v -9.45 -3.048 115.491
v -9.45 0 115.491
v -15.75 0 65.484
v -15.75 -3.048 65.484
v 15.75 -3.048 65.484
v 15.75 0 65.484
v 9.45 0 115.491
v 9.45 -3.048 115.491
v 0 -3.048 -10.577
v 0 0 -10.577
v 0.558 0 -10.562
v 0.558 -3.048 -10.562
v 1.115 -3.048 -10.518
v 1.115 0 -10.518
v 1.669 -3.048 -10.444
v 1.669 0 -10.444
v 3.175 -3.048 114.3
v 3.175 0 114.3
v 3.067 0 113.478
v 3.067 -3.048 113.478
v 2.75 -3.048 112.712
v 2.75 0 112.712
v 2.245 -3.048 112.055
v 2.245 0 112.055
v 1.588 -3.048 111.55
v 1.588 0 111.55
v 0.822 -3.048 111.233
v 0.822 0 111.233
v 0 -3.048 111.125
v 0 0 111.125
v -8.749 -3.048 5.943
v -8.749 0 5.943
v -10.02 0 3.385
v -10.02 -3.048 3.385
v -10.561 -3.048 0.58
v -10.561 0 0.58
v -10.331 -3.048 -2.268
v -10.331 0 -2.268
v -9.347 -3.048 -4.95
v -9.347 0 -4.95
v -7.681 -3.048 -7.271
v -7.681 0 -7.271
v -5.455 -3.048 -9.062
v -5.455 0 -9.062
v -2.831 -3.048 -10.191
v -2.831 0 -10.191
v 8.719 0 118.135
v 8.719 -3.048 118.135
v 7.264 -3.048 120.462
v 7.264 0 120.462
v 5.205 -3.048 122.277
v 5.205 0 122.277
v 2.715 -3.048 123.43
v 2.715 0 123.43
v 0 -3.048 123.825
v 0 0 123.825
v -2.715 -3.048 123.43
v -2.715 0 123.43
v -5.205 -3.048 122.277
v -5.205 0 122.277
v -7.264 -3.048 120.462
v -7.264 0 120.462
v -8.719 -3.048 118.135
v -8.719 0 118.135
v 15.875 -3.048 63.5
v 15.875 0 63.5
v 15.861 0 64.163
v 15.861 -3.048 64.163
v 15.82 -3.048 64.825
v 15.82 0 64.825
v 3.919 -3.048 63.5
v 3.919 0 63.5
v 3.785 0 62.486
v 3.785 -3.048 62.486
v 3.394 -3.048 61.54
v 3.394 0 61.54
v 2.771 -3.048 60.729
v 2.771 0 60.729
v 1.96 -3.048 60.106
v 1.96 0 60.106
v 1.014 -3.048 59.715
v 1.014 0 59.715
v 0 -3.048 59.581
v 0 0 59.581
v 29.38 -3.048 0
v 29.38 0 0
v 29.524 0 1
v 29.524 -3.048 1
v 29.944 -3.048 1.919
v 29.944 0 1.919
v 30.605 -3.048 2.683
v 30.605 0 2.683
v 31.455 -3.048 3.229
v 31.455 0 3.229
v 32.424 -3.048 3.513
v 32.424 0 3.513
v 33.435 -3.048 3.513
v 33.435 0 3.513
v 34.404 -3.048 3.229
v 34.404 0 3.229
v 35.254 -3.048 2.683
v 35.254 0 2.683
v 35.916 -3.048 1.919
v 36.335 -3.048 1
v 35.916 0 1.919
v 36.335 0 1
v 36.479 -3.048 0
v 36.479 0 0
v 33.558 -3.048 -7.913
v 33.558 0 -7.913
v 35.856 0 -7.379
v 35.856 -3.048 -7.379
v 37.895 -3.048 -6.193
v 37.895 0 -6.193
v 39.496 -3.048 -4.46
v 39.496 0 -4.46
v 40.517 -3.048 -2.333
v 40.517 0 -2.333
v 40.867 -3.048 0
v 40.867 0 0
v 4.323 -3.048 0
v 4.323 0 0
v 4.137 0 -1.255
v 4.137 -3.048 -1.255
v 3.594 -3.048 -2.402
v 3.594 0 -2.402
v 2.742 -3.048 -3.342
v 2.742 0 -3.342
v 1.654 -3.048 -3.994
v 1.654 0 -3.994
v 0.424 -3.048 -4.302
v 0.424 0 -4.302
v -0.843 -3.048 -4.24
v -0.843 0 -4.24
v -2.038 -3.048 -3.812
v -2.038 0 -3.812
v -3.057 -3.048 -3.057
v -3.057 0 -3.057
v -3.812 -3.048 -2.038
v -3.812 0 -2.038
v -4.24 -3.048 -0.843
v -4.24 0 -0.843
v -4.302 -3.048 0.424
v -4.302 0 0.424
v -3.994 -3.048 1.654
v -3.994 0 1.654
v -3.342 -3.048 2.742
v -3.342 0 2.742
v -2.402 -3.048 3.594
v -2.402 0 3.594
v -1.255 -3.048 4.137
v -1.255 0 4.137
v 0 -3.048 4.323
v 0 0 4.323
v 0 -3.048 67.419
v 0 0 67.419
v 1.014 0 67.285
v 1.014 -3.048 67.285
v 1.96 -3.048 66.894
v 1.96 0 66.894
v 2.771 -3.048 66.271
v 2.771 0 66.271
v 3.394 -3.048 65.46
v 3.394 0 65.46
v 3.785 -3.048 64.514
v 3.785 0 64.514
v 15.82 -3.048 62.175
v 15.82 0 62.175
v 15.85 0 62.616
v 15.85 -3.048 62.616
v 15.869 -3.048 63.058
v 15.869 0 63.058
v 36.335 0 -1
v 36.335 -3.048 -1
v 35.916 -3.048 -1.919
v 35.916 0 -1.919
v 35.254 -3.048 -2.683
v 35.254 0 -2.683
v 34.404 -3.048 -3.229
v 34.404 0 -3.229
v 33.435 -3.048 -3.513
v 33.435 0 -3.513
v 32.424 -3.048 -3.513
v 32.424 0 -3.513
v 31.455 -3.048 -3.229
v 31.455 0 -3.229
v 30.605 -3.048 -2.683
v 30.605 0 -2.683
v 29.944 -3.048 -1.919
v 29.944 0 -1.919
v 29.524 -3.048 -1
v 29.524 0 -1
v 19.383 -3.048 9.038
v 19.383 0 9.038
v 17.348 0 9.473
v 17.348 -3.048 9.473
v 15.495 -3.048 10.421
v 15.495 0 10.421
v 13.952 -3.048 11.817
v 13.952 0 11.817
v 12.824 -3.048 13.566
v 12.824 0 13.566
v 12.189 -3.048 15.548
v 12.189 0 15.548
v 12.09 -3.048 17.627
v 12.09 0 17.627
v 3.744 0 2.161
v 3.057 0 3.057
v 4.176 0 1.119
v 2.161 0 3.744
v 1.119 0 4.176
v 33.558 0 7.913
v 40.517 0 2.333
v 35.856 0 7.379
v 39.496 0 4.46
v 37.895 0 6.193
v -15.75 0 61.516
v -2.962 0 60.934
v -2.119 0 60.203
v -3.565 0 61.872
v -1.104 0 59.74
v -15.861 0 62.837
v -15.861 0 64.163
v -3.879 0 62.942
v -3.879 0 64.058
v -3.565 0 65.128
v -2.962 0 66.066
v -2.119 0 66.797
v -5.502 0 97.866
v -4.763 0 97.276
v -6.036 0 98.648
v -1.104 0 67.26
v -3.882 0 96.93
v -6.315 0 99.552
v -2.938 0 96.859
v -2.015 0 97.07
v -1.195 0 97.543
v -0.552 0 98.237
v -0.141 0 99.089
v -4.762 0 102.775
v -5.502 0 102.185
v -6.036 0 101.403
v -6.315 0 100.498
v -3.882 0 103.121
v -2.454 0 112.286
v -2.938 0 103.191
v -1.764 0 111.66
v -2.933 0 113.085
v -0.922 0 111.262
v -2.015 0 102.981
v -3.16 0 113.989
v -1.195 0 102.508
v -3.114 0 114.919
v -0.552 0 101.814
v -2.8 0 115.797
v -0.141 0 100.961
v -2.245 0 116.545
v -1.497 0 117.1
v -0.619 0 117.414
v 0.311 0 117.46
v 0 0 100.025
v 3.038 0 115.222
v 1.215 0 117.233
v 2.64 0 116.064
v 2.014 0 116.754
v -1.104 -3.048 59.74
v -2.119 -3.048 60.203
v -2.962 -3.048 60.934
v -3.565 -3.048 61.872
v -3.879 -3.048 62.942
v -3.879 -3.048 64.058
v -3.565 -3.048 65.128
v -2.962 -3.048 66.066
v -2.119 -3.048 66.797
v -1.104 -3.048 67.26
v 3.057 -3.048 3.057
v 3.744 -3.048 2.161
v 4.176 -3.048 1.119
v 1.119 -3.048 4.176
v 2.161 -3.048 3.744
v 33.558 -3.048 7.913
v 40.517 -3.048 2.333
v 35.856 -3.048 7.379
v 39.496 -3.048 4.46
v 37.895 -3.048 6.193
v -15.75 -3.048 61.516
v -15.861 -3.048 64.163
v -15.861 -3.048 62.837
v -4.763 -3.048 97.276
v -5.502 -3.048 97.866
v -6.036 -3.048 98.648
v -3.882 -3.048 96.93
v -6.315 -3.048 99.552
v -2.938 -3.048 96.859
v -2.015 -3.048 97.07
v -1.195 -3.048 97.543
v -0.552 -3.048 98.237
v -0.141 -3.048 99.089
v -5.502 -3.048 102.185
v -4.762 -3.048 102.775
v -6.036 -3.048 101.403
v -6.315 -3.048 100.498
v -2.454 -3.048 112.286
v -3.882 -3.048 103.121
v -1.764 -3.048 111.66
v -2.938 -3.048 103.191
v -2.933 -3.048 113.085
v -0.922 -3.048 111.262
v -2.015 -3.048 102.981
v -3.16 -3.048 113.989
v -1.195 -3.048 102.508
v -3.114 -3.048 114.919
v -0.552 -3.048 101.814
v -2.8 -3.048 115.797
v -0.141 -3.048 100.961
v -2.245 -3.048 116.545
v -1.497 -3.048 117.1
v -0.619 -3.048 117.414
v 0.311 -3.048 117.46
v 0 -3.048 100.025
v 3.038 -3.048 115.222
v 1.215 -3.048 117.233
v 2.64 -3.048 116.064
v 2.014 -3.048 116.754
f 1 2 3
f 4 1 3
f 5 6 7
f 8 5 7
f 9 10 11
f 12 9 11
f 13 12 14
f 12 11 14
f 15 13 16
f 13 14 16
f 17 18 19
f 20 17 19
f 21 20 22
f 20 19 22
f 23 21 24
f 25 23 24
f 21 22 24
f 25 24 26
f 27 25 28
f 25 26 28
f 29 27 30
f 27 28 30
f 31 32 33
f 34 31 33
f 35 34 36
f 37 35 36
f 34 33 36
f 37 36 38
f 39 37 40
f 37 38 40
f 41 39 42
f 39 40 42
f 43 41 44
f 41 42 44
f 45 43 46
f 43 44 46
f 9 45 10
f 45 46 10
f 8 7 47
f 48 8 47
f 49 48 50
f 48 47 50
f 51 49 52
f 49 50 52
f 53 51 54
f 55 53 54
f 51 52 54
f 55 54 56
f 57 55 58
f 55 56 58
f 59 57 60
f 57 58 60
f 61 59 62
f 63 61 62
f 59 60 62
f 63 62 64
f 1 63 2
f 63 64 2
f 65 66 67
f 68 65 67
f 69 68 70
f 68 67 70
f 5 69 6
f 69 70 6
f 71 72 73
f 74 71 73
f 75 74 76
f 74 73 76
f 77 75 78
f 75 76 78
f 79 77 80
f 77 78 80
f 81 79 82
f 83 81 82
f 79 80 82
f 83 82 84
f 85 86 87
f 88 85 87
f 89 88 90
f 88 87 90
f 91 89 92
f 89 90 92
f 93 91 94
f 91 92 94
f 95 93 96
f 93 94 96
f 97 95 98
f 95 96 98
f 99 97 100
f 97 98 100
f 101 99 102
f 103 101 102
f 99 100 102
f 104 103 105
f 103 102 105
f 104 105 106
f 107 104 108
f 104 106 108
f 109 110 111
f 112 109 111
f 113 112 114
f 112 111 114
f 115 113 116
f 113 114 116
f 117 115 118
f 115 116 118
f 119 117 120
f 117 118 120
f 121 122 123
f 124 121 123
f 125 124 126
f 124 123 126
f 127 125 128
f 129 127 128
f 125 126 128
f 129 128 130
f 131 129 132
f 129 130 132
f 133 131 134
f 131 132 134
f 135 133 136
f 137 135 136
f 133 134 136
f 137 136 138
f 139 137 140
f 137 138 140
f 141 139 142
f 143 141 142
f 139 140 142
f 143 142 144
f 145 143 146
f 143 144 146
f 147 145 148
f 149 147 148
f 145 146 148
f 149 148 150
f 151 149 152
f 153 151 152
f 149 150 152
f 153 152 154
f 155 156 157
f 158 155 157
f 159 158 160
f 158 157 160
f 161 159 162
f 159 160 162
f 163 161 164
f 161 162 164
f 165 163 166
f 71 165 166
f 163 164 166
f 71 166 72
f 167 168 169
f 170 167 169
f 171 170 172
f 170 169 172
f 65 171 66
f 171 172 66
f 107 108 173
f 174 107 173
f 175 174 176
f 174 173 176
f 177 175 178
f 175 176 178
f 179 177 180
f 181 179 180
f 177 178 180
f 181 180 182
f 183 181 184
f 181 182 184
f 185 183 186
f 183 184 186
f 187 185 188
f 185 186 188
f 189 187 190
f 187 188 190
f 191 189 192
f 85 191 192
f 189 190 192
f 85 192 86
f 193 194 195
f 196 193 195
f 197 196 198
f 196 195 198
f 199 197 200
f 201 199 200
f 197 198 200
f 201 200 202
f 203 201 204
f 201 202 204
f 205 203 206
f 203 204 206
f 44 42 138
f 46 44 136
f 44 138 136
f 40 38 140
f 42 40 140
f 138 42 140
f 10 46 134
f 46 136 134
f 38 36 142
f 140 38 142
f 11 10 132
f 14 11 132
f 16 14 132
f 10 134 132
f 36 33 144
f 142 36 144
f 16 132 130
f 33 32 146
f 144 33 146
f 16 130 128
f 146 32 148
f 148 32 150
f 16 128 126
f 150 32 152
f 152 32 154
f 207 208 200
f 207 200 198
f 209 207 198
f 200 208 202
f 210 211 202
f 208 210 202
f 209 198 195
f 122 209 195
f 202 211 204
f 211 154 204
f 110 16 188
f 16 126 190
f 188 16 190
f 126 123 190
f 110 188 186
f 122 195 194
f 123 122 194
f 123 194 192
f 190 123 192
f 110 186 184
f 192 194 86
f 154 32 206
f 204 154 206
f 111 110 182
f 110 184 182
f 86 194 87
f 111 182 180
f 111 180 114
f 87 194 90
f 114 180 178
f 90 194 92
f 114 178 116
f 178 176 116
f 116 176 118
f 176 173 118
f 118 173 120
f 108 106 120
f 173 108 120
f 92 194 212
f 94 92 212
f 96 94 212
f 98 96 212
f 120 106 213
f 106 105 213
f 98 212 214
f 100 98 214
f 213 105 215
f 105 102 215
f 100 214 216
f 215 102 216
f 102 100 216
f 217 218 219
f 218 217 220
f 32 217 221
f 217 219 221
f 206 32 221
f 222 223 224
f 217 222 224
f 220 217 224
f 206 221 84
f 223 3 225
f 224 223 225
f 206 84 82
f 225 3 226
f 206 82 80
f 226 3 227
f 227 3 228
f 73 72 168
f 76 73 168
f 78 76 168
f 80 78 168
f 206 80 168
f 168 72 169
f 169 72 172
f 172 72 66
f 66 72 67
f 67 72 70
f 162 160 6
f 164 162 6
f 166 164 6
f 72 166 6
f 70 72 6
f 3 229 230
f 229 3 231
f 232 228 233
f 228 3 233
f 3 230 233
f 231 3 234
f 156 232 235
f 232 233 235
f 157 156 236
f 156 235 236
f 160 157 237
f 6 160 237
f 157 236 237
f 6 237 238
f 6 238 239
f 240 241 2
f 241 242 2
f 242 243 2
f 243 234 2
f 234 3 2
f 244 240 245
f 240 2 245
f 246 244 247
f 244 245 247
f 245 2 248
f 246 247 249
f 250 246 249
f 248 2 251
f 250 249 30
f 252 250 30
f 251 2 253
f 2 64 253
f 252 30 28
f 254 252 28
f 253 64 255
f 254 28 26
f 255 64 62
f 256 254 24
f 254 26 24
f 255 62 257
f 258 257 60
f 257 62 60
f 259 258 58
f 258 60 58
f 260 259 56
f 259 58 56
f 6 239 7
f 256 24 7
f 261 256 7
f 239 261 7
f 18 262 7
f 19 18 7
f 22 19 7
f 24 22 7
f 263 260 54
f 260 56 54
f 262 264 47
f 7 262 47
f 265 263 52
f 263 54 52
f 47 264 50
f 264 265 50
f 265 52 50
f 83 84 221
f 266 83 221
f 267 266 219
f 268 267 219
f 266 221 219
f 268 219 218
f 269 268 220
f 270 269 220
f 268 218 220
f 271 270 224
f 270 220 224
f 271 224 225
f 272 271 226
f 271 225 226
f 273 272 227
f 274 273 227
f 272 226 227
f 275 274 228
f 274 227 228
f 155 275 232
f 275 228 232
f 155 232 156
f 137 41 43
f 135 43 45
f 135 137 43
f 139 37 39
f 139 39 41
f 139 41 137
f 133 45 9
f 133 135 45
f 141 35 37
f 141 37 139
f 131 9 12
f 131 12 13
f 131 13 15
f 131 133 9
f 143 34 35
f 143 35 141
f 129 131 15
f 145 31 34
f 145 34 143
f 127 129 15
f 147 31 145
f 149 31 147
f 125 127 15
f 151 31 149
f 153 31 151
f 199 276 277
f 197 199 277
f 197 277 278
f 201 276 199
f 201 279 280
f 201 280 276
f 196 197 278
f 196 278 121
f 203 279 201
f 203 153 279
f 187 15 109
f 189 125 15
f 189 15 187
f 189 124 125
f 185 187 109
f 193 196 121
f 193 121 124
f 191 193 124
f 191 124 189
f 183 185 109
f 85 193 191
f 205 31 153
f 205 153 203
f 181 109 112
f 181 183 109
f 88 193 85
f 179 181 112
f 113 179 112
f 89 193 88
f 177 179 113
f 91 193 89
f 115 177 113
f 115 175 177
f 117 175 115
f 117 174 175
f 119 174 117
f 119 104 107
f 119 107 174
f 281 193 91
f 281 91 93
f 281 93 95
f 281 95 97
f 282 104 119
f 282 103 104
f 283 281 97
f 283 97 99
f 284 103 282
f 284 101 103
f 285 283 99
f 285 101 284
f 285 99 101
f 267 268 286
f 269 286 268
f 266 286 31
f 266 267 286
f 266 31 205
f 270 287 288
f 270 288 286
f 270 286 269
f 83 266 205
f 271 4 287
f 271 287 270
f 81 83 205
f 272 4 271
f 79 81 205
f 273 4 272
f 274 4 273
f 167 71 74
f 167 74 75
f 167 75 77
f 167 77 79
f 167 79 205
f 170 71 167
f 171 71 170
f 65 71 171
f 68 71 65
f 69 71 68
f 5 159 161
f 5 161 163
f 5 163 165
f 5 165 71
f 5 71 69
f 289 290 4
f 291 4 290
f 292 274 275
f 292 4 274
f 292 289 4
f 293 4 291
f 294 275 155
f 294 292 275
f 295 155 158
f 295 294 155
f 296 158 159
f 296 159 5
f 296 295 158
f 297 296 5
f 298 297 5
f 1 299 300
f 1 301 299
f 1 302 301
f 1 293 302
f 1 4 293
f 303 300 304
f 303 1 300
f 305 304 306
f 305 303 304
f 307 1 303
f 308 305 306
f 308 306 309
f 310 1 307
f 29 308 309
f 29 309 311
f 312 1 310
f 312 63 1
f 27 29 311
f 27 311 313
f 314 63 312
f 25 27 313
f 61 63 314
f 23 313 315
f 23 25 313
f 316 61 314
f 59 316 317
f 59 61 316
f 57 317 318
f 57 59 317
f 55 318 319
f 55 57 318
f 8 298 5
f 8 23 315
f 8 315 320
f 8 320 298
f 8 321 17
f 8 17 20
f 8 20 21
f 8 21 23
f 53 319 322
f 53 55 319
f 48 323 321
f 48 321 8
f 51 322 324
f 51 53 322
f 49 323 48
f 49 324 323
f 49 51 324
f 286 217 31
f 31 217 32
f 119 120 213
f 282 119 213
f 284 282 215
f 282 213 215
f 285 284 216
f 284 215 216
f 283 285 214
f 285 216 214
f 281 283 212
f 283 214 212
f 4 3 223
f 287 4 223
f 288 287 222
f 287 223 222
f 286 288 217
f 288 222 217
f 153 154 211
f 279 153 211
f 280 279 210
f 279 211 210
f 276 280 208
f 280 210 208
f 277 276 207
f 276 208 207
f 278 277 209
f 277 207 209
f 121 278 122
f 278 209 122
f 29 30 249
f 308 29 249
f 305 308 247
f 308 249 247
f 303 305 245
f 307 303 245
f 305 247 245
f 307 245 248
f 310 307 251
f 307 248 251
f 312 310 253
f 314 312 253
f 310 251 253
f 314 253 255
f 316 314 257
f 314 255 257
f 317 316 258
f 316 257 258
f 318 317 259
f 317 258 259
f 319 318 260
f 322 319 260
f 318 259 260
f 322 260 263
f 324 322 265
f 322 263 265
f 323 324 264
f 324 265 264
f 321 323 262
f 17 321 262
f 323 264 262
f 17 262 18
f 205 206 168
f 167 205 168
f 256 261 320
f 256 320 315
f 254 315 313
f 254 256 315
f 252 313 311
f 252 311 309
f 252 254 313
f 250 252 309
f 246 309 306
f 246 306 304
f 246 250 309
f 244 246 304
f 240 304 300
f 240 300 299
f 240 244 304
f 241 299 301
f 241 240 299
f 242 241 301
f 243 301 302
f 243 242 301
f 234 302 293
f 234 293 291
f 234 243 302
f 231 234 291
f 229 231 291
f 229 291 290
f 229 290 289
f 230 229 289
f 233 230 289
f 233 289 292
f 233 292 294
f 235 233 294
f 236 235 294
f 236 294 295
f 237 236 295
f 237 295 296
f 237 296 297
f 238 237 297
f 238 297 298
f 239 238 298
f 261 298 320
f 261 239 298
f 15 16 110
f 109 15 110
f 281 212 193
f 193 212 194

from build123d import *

# Parameters (mm, degrees)
F0_R     = 3.175
F1_DEPTH = 3.048


with BuildPart() as f1:
    # F0 (on Front) → F1 (new body)
    with BuildSketch(Plane.XZ):
        with BuildLine():
            ThreePointArc((0, 59.5809938932), (-3.9190061068, 63.5), (0, 67.4190061068))
            Line((0, 67.4190061068), (0, 79.375))
            ThreePointArc((0, 79.375), (-10.5003255158, 75.40625), (-15.7504882737, 65.484375))
            Line((-15.7504882737, 65.484375), (-15.7504882737, 61.515625))
            ThreePointArc((-15.7504882737, 61.515625), (-10.5003255158, 51.59375), (0, 47.625))
            Line((0, 47.625), (0, 59.5809938932))
        make_face()
        with BuildLine():
            Line((0, 79.375), (0, 67.4190061068))
            ThreePointArc((0, 67.4190061068), (2.7711557936, 66.2711557936), (3.9190061068, 63.5))
            ThreePointArc((3.9190061068, 63.5), (2.7711557936, 60.7288442064), (0, 59.5809938932))
            Line((0, 59.5809938932), (0, 47.625))
            ThreePointArc((0, 47.625), (10.7468179803, 51.8157572647), (15.8196447136, 62.1754373797))
            ThreePointArc((15.8196447136, 62.1754373797), (15.8611551412, 62.8371405988), (15.875, 63.5))
            ThreePointArc((15.875, 63.5), (15.8438414904, 64.4941387366), (15.7504882737, 65.484375))
            ThreePointArc((15.7504882737, 65.484375), (10.5003255158, 75.40625), (0, 79.375))
        make_face()
        with BuildLine():
            ThreePointArc((-15.7504882737, 65.484375), (-10.5003255158, 75.40625), (0, 79.375))
            Line((0, 79.375), (0, 100.0252))
            Line((0, 100.0252), (0, 104.775))
            ThreePointArc((0, 104.775), (-7.14375, 107.9998046905), (-9.4502929642, 115.490625))
            Line((-9.4502929642, 115.490625), (-15.7504882737, 65.484375))
        make_face()
        with Locations((-3.175, 100.0252)):
            Circle(F0_R, mode=Mode.SUBTRACT)
        with BuildLine():
            Line((0, 100.0252), (0, 79.375))
            ThreePointArc((0, 79.375), (10.5003255158, 75.40625), (15.7504882737, 65.484375))
            Line((15.7504882737, 65.484375), (9.4502929642, 115.490625))
            ThreePointArc((9.4502929642, 115.490625), (9.5063048942, 114.896483242), (9.525, 114.3))
            ThreePointArc((9.525, 114.3), (6.7351920908, 107.5648079092), (0, 104.775))
            Line((0, 104.775), (0, 100.0252))
        make_face()
        with BuildLine():
            Line((0, 10.5767495189), (0, 47.625))
            ThreePointArc((0, 47.625), (-10.5003255158, 51.59375), (-15.7504882737, 61.515625))
            Line((-15.7504882737, 61.515625), (-8.7490265409, 5.9432453232))
            ThreePointArc((-8.7490265409, 5.9432453232), (-4.9501218809, 9.3468670553), (0, 10.5767495189))
        make_face()
        with BuildLine():
            ThreePointArc((15.8196447136, 62.1754373797), (10.7468179803, 51.8157572647), (0, 47.625))
            Line((0, 47.625), (0, 10.5767495189))
            ThreePointArc((0, 10.5767495189), (7.4788913077, 7.4788913077), (10.5767495189, 0))
            Line((10.5767495189, 0), (24.9921450567, 0))
            ThreePointArc((24.9921450567, 0), (27.5436570711, 5.8305265344), (33.5578243434, 7.9126036823))
            Line((33.5578243434, 7.9126036823), (19.3829058745, 9.037946304))
            ThreePointArc((19.3829058745, 9.037946304), (13.9520765692, 11.8171520245), (12.0896121754, 17.6265511124))
            Line((12.0896121754, 17.6265511124), (15.8196447136, 62.1754373797))
        make_face()
        with BuildLine():
            Line((-15.7504882737, 61.515625), (-15.7504882737, 65.484375))
            ThreePointArc((-15.7504882737, 65.484375), (-15.875, 63.5), (-15.7504882737, 61.515625))
        make_face()
        with BuildLine():
            ThreePointArc((10.5767495189, 0), (7.4788913077, 7.4788913077), (0, 10.5767495189))
            ThreePointArc((0, 10.5767495189), (-4.9501218809, 9.3468670553), (-8.7490265409, 5.9432453232))
            ThreePointArc((-8.7490265409, 5.9432453232), (-9.3468670553, -4.9501218809), (0, -10.5767495189))
            Line((0, -10.5767495189), (1.6688517724, -10.4442598659))
            ThreePointArc((1.6688517724, -10.4442598659), (8.0473181112, -6.8635487616), (10.5767495189, 0))
        make_face()
        with BuildLine():
            ThreePointArc((4.322937818, 0), (-3.0567786457, -3.0567786457), (0, 4.322937818))
            ThreePointArc((0, 4.322937818), (3.0567786457, 3.0567786457), (4.322937818, 0))
        make_face(mode=Mode.SUBTRACT)
        with BuildLine():
            ThreePointArc((-9.4502929642, 115.490625), (-7.14375, 107.9998046905), (0, 104.775))
            ThreePointArc((0, 104.775), (6.7351920908, 107.5648079092), (9.525, 114.3))
            ThreePointArc((9.525, 114.3), (9.5063048942, 114.896483242), (9.4502929642, 115.490625))
            ThreePointArc((9.4502929642, 115.490625), (0, 123.825), (-9.4502929642, 115.490625))
        make_face()
        with BuildLine():
            ThreePointArc((3.175, 114.3), (2.2450640303, 112.0549359697), (0, 111.125))
            ThreePointArc((0, 111.125), (-2.2450640303, 116.5450640303), (3.175, 114.3))
        make_face(mode=Mode.SUBTRACT)
        with BuildLine():
            Line((24.9921450567, 0), (10.5767495189, 0))
            ThreePointArc((10.5767495189, 0), (8.0473181112, -6.8635487616), (1.6688517724, -10.4442598659))
            Line((1.6688517724, -10.4442598659), (33.5578243434, -7.9126036823))
            ThreePointArc((33.5578243434, -7.9126036823), (27.5436570711, -5.8305265344), (24.9921450567, 0))
        make_face()
        with BuildLine():
            Line((1.6688517724, -10.4442598659), (0, -10.5767495189))
            ThreePointArc((0, -10.5767495189), (0.8370513345, -10.5435750791), (1.6688517724, -10.4442598659))
        make_face()
        with BuildLine():
            ThreePointArc((33.5578243434, 7.9126036823), (27.5436570711, 5.8305265344), (24.9921450567, 0))
            ThreePointArc((24.9921450567, 0), (27.5436570711, -5.8305265344), (33.5578243434, -7.9126036823))
            ThreePointArc((33.5578243434, -7.9126036823), (38.7601715912, -5.3859879856), (40.8671450567, 0))
            ThreePointArc((40.8671450567, 0), (38.7601715912, 5.3859879856), (33.5578243434, 7.9126036823))
        make_face()
        with BuildLine():
            ThreePointArc((36.4792131905, 0), (32.9296450567, -3.5495681337), (29.380076923, 0))
            ThreePointArc((29.380076923, 0), (32.9296450567, 3.5495681337), (36.4792131905, 0))
        make_face(mode=Mode.SUBTRACT)
    extrude(amount=F1_DEPTH)


solid = f1.part
